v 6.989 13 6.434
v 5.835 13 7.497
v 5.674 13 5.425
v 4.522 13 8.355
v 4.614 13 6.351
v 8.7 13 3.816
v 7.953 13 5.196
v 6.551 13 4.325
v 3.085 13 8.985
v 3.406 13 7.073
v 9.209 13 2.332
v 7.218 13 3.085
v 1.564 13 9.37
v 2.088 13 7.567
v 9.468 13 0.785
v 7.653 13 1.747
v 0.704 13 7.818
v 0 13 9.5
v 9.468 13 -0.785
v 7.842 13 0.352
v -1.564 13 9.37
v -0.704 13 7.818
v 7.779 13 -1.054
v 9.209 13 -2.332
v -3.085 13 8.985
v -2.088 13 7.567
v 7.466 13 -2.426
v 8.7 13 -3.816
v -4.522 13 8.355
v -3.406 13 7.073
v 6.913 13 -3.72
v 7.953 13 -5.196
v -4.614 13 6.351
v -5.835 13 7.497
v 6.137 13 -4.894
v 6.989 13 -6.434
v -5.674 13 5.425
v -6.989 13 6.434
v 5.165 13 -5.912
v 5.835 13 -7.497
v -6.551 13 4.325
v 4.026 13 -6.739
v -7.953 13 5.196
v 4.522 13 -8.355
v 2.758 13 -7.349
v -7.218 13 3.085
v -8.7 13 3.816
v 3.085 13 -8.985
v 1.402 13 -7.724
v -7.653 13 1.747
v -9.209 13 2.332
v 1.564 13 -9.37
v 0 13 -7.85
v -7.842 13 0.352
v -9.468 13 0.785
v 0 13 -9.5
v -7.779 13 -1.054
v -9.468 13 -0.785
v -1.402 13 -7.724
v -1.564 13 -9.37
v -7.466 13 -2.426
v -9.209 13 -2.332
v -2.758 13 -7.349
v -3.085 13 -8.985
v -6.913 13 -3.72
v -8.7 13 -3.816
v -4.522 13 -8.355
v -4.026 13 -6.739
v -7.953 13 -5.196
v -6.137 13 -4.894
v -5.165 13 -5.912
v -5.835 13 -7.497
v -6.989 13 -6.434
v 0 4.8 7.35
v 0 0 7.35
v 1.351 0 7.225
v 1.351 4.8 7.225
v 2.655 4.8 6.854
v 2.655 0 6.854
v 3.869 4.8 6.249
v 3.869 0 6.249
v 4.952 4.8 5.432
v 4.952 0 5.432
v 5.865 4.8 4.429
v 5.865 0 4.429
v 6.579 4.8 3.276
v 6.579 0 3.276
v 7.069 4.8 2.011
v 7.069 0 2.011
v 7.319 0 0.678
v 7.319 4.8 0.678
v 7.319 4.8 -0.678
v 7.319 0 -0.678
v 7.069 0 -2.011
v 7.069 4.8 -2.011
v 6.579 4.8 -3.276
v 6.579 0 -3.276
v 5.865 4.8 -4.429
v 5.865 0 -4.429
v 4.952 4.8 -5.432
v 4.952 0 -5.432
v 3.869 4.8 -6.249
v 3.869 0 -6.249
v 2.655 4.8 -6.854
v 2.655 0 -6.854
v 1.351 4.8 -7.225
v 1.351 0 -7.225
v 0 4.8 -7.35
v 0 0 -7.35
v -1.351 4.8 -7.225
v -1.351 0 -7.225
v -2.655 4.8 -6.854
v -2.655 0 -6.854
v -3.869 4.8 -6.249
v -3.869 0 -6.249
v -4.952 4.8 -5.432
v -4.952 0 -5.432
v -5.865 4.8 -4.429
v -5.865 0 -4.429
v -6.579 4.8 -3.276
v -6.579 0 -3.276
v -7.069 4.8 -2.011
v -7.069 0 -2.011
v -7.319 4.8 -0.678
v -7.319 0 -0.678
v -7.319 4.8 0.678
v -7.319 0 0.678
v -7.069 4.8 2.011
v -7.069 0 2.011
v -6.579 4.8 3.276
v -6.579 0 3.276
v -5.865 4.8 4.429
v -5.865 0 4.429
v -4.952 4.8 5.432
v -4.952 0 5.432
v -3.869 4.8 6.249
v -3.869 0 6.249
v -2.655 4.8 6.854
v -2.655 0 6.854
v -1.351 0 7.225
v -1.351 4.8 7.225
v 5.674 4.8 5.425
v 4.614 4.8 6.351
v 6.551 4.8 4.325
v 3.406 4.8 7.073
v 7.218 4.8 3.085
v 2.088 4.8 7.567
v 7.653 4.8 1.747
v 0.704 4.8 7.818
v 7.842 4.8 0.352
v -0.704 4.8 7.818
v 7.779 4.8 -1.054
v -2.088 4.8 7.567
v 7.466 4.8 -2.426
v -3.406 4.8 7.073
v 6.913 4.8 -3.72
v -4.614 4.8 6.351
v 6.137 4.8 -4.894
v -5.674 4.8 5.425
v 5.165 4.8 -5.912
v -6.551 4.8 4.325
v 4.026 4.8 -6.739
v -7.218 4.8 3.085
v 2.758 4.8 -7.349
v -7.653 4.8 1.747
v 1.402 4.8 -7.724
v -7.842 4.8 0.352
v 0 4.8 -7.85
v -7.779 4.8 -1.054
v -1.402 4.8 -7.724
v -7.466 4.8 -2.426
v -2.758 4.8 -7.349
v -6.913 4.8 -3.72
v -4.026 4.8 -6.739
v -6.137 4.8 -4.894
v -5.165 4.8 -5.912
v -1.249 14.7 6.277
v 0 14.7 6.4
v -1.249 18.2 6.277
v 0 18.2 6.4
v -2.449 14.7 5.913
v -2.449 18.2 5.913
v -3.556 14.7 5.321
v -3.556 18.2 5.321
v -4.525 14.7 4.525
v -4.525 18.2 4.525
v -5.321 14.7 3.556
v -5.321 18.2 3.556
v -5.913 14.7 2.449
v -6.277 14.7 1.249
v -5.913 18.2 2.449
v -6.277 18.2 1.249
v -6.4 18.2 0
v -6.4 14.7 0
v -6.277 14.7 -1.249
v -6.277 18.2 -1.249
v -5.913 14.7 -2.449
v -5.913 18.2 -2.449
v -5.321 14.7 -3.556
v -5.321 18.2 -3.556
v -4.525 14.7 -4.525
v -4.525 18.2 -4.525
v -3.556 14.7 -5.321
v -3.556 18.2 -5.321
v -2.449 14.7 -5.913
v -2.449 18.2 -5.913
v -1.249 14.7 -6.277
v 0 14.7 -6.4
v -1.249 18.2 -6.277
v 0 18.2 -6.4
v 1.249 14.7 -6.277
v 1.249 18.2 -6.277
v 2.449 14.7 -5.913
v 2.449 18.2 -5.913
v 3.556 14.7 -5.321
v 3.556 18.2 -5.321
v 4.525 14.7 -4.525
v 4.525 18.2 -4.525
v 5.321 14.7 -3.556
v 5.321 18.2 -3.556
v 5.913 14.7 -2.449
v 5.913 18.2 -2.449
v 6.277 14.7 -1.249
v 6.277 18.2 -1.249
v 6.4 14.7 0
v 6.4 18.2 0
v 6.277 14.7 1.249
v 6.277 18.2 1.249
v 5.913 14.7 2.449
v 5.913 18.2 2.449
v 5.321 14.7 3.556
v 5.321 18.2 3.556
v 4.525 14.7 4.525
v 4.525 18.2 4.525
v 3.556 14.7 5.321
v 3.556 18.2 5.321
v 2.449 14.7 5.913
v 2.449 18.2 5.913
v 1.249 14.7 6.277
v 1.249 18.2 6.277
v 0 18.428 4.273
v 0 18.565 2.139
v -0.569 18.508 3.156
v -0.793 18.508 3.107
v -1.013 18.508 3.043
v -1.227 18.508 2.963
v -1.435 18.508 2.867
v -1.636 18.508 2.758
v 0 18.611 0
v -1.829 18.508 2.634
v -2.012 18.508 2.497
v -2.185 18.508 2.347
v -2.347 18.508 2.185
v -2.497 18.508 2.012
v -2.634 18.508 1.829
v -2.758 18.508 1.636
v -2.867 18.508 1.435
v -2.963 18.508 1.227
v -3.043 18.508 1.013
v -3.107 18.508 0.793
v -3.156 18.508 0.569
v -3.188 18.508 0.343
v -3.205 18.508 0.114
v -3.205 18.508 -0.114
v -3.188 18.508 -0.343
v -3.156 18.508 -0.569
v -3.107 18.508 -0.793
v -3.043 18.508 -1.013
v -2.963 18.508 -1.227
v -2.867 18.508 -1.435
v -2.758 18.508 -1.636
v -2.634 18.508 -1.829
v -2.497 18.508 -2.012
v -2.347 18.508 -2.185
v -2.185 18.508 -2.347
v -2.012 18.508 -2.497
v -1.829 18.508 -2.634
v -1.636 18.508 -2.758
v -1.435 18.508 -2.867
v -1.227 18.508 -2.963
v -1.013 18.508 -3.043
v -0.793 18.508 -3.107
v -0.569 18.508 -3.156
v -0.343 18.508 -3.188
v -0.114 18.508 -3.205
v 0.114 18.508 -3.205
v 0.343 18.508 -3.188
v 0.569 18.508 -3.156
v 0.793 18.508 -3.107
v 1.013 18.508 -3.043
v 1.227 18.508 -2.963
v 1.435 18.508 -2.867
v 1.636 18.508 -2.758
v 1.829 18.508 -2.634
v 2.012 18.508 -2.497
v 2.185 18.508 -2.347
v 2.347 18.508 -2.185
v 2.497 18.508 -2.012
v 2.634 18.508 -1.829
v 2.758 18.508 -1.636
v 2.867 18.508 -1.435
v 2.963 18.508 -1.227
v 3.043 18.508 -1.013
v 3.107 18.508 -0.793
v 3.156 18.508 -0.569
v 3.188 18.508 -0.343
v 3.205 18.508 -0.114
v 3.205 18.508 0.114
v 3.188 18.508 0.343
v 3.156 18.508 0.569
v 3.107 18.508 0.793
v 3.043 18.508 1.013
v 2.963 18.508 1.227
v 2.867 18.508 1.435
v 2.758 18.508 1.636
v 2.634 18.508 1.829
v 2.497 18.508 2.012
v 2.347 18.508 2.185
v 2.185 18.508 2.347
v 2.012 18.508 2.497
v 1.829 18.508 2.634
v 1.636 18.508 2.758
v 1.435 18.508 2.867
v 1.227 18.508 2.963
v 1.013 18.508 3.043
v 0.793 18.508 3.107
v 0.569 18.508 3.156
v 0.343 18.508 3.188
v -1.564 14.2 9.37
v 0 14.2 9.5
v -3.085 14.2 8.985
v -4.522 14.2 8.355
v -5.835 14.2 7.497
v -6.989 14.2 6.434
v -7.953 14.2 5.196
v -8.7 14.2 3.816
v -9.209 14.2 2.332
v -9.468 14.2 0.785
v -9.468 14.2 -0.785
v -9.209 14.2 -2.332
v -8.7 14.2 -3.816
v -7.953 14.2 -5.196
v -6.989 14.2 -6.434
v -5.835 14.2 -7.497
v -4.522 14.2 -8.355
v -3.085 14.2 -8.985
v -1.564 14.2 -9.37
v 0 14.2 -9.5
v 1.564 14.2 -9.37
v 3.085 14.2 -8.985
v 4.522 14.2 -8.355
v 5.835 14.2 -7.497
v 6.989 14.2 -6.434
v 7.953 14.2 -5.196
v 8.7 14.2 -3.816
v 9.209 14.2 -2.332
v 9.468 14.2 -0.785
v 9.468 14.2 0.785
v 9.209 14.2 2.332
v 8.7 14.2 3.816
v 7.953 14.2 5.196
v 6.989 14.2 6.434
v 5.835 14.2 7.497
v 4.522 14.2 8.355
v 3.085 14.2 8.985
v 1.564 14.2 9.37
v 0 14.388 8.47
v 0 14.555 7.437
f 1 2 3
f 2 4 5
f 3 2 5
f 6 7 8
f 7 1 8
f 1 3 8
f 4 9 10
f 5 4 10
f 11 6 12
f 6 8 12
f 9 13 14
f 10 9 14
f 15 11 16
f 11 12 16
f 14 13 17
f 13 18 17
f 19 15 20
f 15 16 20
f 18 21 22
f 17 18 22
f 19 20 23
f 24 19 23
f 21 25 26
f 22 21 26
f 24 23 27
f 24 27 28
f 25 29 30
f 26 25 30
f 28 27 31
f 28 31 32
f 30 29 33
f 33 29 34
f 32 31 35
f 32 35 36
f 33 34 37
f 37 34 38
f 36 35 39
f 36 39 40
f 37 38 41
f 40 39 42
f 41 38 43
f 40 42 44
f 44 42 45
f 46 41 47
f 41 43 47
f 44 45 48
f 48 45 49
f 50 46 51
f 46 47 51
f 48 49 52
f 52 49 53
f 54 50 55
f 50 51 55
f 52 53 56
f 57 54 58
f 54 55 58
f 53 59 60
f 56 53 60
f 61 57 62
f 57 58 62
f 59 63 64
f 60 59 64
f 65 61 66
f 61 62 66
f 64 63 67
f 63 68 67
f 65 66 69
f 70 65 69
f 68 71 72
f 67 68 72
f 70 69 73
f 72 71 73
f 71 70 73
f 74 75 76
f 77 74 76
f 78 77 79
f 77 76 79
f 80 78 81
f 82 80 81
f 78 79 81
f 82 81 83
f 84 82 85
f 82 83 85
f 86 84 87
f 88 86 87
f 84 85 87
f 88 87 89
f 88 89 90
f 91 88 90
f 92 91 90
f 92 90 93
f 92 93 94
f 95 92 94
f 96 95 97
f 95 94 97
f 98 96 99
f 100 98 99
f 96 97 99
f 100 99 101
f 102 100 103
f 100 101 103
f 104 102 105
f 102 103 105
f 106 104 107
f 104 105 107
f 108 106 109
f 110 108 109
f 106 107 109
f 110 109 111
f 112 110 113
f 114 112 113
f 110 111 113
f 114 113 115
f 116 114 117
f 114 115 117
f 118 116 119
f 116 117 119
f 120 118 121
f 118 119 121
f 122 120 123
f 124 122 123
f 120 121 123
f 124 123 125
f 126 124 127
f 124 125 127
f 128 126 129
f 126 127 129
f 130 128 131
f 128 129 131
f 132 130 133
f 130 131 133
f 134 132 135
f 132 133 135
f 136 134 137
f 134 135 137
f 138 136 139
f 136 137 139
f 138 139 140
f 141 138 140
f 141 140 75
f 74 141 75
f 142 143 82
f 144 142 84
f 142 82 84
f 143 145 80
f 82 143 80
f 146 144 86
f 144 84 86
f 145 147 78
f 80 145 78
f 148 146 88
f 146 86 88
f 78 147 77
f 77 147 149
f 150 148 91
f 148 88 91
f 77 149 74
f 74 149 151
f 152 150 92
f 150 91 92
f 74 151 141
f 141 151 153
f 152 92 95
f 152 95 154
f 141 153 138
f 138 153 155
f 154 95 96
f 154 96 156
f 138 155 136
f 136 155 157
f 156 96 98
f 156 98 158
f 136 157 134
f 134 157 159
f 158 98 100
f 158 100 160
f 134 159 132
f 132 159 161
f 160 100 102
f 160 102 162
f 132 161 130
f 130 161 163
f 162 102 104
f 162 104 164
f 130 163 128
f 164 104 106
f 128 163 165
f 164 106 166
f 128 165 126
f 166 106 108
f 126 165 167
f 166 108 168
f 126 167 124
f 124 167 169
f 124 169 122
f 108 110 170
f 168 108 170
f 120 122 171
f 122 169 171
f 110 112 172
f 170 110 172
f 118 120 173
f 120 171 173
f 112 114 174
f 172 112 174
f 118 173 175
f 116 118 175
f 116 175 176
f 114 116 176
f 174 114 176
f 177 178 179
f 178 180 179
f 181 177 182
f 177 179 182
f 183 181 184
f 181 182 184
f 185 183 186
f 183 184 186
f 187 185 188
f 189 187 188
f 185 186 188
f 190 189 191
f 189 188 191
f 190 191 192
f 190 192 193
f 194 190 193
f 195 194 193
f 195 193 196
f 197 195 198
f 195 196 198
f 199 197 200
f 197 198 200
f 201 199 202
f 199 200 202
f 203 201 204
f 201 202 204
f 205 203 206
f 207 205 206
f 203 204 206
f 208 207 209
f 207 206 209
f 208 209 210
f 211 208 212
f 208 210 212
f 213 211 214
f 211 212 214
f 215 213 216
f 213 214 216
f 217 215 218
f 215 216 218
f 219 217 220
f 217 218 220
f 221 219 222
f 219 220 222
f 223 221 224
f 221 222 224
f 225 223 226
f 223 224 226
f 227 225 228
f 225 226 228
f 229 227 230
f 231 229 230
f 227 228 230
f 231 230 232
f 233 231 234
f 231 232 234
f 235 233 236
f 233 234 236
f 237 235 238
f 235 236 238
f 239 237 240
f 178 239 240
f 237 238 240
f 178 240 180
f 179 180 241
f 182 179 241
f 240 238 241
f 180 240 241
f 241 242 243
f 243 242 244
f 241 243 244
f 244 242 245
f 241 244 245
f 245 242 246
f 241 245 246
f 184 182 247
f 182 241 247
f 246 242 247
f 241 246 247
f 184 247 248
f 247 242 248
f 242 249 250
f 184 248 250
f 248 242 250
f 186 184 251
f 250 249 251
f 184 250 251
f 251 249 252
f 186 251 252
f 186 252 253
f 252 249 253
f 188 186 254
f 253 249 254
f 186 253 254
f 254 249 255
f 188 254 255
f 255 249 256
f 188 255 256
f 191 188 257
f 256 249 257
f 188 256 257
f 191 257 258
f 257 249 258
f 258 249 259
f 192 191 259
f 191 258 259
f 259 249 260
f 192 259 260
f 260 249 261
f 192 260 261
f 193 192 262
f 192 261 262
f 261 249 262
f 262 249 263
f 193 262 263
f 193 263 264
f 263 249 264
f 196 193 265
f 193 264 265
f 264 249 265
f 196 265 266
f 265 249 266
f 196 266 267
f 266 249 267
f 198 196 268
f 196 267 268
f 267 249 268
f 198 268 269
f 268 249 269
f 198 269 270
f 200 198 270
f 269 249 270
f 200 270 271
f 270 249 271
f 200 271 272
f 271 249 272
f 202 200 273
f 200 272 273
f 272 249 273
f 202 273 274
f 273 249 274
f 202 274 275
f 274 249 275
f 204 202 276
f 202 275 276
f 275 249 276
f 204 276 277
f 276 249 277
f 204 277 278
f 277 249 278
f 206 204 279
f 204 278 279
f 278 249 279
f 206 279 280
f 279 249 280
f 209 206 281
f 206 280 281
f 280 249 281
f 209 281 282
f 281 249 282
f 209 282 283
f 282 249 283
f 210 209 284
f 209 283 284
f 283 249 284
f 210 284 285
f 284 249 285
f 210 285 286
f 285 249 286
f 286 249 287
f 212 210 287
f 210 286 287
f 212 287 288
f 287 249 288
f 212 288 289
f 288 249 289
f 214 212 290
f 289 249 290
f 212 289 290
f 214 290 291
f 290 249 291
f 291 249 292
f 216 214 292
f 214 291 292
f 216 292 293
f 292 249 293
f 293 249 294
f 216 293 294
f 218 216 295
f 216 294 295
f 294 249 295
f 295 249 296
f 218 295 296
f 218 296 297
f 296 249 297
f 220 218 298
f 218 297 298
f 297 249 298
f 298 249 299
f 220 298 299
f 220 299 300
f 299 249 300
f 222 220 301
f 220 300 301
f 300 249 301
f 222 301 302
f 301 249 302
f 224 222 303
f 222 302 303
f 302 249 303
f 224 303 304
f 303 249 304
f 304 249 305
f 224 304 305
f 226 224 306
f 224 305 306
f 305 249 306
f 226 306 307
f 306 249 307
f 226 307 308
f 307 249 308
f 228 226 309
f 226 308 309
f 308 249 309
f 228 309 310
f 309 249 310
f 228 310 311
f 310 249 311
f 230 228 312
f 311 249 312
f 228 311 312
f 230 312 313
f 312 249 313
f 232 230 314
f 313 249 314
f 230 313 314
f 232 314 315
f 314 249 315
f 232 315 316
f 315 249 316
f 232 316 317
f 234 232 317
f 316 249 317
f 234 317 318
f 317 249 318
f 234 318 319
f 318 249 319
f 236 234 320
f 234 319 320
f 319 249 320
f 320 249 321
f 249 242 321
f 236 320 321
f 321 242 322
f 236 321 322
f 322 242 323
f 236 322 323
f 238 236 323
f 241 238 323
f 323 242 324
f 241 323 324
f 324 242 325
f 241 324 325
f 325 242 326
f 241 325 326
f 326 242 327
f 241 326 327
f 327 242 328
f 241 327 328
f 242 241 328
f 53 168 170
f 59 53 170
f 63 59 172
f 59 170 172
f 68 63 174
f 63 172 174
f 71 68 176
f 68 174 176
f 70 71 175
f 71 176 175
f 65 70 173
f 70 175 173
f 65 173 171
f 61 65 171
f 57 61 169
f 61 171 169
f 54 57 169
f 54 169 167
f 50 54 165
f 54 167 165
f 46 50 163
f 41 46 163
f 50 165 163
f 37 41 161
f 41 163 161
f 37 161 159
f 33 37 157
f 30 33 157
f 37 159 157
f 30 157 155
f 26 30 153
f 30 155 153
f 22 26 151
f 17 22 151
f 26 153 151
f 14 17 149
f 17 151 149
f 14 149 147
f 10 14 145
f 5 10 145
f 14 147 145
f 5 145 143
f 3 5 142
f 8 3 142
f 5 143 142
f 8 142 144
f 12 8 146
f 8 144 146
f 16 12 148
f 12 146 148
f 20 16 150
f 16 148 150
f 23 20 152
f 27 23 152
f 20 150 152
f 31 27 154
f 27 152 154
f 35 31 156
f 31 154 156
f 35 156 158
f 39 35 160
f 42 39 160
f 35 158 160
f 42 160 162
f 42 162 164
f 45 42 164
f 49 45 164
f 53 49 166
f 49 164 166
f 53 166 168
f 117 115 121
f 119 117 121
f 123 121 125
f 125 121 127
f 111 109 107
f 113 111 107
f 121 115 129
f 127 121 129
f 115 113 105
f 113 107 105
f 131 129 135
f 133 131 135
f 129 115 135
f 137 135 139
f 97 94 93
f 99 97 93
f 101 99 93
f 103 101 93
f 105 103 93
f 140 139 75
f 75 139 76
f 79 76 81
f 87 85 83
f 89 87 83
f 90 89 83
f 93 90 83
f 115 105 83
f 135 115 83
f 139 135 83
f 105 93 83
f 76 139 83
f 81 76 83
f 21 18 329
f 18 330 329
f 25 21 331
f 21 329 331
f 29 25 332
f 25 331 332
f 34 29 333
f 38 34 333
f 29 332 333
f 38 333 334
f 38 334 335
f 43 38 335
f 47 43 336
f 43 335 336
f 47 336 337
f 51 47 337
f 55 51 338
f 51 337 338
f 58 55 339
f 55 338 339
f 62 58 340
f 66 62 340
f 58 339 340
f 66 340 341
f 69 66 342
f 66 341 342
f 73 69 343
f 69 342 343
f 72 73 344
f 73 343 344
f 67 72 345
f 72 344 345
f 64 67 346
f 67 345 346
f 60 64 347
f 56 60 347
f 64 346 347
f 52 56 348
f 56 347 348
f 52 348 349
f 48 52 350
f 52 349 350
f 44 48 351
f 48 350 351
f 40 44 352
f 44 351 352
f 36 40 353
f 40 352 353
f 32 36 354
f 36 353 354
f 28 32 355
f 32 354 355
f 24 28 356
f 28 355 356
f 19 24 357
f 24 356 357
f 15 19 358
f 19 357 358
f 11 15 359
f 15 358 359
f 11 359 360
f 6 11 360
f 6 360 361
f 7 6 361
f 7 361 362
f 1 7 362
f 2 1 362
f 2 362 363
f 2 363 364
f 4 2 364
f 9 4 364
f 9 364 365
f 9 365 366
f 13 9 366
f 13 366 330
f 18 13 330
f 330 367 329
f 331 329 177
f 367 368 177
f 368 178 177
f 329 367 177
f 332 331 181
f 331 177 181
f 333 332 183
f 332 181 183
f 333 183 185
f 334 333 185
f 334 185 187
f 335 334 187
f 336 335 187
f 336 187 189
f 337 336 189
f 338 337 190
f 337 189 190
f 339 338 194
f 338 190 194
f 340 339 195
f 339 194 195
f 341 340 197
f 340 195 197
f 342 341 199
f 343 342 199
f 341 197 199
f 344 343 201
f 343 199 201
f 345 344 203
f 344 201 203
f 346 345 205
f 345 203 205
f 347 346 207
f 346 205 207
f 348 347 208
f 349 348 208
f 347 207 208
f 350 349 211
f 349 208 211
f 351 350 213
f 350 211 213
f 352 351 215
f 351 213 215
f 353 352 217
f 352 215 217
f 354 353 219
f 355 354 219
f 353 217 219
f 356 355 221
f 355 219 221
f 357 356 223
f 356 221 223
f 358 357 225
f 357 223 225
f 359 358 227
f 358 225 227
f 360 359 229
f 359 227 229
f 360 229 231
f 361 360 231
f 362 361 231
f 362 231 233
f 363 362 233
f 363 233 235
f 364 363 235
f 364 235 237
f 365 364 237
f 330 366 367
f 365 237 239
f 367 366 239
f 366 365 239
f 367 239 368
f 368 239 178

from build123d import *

# Parameters (mm, degrees)
SKETCH1_R           = 7.35
BOSS_EXTRUDE1_DEPTH = 4.8
SKETCH2_R           = 7.85
BOSS_EXTRUDE2_DEPTH = 8.2


with BuildPart() as part:
    # Sketch1 → Boss-Extrude1 (new body)
    with BuildSketch(Plane(origin=(0, 0, 0), x_dir=(1, 0, 0), z_dir=(0, 1, 0))):
        with Locations(Location((0, 0, 0), (0, 0, 270))):
            Circle(SKETCH1_R)
    extrude(amount=BOSS_EXTRUDE1_DEPTH)

    # Sketch2 → Boss-Extrude2 (add)
    with BuildSketch(Plane(origin=(0, 4.8, 0), x_dir=(1, 0, 0), z_dir=(0, 1, 0))):
        with Locations(Location((0, 0, 0), (0, 0, 90))):
            Circle(SKETCH2_R)
    extrude(amount=BOSS_EXTRUDE2_DEPTH)

    # Sketch3 → Revolve2 (revolve)
    with BuildSketch(Plane.XY, mode=Mode.PRIVATE) as revolve2_sk:
        with BuildLine():
            Line((0, 18.610795484), (0, 13))
            Line((0, 13), (-7.85, 13))
            Line((-7.85, 13), (-9.5, 13))
            Line((-9.5, 13), (-9.5, 14.2))
            ThreePointArc((-9.5, 14.2), (-7.953922053, 14.474092821), (-6.4, 14.699503876))
            Line((-6.4, 14.699503876), (-6.4, 18.199503876))
            ThreePointArc((-6.4, 18.199503876), (-3.206601035, 18.507866639), (0, 18.610795484))
        make_face()
    revolve(revolve2_sk.sketch.rotate(Axis((0, 15.200891001, 0), (0, -1, 0)), 270), axis=Axis((0, 15.200891001, 0), (0, -1, 0)))


solid = part.part
